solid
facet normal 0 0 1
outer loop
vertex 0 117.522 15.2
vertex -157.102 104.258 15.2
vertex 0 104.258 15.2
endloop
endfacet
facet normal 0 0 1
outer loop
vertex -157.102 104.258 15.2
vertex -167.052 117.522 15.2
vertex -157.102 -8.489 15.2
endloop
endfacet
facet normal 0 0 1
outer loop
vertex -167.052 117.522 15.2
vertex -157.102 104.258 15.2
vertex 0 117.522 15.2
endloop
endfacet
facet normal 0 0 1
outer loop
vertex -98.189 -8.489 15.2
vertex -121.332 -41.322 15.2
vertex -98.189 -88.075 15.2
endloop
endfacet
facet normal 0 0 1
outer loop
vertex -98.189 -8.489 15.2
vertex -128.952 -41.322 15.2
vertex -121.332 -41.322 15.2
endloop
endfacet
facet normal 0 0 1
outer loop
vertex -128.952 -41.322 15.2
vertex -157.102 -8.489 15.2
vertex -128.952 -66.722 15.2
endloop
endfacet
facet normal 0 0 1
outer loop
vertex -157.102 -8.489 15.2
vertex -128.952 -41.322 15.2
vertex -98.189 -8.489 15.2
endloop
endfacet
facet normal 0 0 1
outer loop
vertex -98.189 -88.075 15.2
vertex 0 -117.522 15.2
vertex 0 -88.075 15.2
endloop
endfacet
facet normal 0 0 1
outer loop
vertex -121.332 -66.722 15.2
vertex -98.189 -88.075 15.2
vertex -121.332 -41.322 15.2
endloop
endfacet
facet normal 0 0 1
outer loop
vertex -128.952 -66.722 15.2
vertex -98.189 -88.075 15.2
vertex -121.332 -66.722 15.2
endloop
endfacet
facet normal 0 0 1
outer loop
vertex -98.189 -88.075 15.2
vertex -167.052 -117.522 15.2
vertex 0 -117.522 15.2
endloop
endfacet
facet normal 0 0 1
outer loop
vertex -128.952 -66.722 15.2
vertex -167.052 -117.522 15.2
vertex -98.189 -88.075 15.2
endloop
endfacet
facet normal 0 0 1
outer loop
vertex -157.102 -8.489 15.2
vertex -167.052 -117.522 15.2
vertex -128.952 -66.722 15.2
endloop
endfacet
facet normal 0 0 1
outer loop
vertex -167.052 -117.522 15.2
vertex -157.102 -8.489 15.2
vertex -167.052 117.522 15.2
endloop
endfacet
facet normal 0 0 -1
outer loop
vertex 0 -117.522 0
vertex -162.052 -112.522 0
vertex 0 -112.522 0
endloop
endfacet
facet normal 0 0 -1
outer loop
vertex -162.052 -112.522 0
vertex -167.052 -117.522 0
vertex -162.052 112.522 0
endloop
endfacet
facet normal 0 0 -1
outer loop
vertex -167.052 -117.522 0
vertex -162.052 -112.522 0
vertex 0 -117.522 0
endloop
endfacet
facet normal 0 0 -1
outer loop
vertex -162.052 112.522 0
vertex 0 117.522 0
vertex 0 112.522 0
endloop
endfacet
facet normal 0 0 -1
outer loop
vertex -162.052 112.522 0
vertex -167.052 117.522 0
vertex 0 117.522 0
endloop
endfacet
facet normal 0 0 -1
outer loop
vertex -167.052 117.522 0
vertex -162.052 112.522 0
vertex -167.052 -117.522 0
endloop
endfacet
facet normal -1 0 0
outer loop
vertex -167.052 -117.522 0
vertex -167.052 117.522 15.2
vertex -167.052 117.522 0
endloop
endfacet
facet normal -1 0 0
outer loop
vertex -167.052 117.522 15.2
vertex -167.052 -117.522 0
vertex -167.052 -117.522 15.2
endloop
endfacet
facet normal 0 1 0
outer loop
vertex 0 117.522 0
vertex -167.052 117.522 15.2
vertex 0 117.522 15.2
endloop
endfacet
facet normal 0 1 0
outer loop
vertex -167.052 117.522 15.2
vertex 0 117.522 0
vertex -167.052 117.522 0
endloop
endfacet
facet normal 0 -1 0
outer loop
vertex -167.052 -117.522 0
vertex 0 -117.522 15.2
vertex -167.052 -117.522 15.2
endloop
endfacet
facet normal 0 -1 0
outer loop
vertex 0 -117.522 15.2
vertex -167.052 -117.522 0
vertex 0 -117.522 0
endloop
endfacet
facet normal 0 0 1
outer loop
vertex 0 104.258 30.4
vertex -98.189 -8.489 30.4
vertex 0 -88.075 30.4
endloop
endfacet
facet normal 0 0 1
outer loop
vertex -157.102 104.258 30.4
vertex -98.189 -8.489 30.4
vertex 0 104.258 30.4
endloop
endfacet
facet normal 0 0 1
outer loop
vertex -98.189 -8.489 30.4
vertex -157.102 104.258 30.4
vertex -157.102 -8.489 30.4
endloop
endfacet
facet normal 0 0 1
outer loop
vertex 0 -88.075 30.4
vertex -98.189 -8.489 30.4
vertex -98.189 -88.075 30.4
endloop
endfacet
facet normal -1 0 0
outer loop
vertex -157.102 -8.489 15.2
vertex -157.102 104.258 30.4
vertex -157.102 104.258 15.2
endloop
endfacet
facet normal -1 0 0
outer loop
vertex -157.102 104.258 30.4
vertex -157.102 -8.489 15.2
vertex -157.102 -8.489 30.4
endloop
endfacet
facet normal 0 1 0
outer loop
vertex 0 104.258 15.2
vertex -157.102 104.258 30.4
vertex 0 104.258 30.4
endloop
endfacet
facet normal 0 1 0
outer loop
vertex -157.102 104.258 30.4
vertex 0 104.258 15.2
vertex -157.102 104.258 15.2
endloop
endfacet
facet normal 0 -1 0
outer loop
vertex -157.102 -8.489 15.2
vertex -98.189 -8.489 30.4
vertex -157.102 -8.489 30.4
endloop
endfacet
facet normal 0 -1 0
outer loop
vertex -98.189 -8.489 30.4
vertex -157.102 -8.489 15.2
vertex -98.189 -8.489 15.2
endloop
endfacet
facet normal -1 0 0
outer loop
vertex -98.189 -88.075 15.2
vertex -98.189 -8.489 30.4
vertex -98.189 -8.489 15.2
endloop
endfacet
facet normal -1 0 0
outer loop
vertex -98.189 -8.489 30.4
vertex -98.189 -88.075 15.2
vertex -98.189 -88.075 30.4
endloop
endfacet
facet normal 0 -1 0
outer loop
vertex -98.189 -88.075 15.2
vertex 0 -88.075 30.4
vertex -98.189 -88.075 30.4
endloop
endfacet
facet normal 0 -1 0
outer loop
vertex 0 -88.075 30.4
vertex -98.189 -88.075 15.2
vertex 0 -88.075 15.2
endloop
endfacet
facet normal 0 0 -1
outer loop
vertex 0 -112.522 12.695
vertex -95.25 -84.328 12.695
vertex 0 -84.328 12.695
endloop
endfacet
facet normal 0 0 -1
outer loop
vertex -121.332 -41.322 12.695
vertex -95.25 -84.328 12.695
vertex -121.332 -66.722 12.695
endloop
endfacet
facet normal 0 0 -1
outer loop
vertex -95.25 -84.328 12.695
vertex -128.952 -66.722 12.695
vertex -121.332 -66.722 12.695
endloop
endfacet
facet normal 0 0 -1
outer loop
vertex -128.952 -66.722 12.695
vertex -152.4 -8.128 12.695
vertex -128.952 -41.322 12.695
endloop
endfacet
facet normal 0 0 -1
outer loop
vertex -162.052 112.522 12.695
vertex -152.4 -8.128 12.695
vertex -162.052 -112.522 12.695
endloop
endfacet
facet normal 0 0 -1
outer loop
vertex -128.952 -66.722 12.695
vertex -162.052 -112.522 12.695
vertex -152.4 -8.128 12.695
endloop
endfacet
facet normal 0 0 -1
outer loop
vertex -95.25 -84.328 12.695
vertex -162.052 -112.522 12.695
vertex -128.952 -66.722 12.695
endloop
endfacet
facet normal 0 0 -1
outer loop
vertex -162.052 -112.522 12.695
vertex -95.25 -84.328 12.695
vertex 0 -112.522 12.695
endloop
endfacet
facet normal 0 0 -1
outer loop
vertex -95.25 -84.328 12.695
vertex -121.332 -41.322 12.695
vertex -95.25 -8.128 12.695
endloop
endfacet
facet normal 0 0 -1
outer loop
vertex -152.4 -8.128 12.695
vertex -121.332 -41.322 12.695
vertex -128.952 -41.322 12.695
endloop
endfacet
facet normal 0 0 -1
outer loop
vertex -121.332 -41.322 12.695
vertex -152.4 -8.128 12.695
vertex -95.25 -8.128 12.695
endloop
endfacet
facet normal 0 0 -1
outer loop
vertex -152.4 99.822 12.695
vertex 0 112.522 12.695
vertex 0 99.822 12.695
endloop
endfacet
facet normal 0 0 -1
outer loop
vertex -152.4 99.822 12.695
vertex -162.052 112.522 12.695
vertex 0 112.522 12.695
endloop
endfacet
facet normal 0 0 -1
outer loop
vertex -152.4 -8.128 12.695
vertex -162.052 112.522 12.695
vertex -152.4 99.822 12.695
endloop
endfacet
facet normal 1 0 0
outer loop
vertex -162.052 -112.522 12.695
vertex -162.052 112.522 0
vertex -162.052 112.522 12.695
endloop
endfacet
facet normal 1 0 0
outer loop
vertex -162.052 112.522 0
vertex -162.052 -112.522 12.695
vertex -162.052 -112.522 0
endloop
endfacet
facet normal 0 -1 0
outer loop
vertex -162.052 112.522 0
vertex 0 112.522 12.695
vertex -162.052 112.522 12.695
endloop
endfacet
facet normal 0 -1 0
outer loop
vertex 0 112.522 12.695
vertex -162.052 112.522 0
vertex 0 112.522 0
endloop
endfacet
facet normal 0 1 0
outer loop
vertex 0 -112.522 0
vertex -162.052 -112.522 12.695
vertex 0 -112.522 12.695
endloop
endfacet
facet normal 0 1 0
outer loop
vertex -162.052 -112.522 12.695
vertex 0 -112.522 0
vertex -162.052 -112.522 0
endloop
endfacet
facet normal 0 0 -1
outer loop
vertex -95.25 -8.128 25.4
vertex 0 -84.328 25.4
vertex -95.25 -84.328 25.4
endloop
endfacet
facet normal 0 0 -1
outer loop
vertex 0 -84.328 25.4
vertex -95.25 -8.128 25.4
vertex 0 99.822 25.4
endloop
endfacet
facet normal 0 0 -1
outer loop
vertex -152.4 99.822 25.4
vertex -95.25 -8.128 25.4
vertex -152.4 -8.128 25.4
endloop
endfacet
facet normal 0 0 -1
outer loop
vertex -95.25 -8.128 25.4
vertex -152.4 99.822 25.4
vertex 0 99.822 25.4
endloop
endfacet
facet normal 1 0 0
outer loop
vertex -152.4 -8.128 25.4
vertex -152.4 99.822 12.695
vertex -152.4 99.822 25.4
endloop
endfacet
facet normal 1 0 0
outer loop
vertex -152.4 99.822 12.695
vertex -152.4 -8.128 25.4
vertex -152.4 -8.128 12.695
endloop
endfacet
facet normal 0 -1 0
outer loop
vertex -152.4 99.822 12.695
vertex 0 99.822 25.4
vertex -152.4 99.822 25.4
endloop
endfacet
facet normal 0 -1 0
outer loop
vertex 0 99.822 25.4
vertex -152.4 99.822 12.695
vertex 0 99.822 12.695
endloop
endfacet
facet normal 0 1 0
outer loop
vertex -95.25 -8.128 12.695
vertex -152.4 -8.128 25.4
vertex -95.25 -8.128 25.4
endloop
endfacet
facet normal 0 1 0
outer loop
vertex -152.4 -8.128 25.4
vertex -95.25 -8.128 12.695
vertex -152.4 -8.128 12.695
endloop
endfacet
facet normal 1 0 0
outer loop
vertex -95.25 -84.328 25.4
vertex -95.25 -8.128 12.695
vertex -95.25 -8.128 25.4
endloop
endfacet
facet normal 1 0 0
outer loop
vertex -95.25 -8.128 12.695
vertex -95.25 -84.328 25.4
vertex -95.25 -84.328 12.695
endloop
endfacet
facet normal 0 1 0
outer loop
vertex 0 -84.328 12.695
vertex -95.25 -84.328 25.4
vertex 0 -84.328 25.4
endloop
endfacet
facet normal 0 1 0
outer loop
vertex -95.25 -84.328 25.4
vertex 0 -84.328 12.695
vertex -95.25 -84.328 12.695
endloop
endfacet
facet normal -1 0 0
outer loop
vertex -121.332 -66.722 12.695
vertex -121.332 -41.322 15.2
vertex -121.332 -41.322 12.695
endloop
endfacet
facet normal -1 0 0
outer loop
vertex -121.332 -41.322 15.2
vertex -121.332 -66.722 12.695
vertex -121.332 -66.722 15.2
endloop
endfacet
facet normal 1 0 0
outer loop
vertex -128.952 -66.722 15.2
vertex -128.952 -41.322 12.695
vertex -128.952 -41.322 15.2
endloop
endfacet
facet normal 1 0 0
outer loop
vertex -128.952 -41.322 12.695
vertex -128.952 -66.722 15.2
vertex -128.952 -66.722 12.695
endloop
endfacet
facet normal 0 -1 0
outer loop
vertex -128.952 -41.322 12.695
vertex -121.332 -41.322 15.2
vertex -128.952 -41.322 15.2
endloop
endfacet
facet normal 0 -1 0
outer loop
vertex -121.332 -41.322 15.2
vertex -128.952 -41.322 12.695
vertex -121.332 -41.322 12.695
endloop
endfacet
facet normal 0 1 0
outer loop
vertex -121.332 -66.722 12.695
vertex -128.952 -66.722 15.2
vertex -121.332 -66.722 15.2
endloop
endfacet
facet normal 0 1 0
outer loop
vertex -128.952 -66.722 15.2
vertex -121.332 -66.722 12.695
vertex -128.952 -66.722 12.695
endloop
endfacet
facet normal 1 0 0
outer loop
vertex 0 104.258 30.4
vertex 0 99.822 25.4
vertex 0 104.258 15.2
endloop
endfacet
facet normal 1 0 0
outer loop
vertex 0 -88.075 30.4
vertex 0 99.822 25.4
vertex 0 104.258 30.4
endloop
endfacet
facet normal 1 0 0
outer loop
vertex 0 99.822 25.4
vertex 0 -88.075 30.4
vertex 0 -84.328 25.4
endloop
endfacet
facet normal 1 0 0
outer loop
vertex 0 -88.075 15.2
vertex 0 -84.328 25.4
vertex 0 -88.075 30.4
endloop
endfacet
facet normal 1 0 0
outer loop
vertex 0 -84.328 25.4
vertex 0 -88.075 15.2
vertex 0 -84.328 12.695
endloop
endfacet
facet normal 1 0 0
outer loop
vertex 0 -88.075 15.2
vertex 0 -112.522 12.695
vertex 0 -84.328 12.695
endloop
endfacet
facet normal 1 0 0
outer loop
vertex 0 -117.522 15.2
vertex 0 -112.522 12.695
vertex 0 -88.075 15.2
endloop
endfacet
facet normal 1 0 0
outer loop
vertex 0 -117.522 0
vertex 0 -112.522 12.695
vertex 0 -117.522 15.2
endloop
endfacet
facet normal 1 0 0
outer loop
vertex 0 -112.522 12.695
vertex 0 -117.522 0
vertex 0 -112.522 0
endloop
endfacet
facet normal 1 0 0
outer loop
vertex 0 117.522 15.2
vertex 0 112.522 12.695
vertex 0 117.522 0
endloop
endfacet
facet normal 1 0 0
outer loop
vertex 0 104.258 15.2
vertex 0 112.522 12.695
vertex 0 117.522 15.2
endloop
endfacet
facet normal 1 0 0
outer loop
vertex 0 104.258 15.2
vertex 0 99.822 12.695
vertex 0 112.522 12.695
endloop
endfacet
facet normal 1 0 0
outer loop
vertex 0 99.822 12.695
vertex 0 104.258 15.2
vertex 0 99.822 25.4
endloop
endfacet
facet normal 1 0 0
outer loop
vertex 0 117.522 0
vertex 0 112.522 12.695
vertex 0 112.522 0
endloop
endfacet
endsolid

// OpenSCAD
// helpers
function inches(x) = x * 25.4;

// battery dimensions
battery_length = inches(12.76);
battery_width = inches(8.86);
large_bump_length = inches(12);
large_bump_width = inches(4.25);
small_bump_length = inches(7.5);
small_bump_width = inches(3);
cap_height = inches(1);
terminal_offset_x = inches(1.5);
terminal_offset_y = inches(2);
terminal_dim_x = inches(0.3);
terminal_dim_y = inches(1);

// config dimensions
thickness = 5;  // wall thickness

// calc dimensions
large_bump_widthwise_offset = battery_width - large_bump_width - inches(0.5);
small_bump_widthwise_offset = large_bump_widthwise_offset - small_bump_width;
outer_dimensions = [
    battery_length + 2*thickness,
    battery_width + 2*thickness,
    cap_height + thickness
];

module base_plate() {
    resize([battery_length, battery_width, cap_height])
        cube();
}

module large_bump() {
    lengthwise_offset = (battery_length - large_bump_length)/2;
    translate([lengthwise_offset, large_bump_widthwise_offset, cap_height-0.01])
        resize([large_bump_length, large_bump_width, cap_height+0.01])
            cube();
}

module small_bump() {
    lengthwise_offset = (battery_length - small_bump_length)/2;
    translate([lengthwise_offset, small_bump_widthwise_offset, cap_height-0.01])
        resize([small_bump_length, small_bump_width, cap_height+0.01])
            cube();
}

module battery_cap_blank() {
    base_plate();
    large_bump();
    small_bump();
}

module terminal_blank() {
        resize([terminal_dim_x, terminal_dim_y, cap_height * 2])
            cube();
} 

module battery_cap() {
    right_terminal_translation = battery_length + 2*thickness - terminal_offset_x - terminal_dim_x;
    translate([-outer_dimensions[0]/2, -outer_dimensions[1]/2, 0])
    difference() {
        resize(outer_dimensions)battery_cap_blank();
        union() {
            translate([thickness, thickness, -0.01])
                resize([battery_length, battery_width, cap_height+0.01])
                    battery_cap_blank();
            translate([terminal_offset_x, terminal_offset_y, 0])
                terminal_blank();
            translate([right_terminal_translation, terminal_offset_y, 0])
                terminal_blank();
        }
    }
}

module halving_blank() {
    translate([0, -outer_dimensions[1]/2-1, -1])
        resize([battery_length + 3*thickness, battery_width + 3*thickness, cap_height + 2*thickness])
            cube();
}

module battery_cap_left() {
    difference() {
        battery_cap();
        halving_blank();
    }
}

module battery_cap_right() {
    difference() {
        battery_cap();
        mirror([1, 0, 0])
            halving_blank();
    }
}

battery_cap_left();
* battery_cap_right();
